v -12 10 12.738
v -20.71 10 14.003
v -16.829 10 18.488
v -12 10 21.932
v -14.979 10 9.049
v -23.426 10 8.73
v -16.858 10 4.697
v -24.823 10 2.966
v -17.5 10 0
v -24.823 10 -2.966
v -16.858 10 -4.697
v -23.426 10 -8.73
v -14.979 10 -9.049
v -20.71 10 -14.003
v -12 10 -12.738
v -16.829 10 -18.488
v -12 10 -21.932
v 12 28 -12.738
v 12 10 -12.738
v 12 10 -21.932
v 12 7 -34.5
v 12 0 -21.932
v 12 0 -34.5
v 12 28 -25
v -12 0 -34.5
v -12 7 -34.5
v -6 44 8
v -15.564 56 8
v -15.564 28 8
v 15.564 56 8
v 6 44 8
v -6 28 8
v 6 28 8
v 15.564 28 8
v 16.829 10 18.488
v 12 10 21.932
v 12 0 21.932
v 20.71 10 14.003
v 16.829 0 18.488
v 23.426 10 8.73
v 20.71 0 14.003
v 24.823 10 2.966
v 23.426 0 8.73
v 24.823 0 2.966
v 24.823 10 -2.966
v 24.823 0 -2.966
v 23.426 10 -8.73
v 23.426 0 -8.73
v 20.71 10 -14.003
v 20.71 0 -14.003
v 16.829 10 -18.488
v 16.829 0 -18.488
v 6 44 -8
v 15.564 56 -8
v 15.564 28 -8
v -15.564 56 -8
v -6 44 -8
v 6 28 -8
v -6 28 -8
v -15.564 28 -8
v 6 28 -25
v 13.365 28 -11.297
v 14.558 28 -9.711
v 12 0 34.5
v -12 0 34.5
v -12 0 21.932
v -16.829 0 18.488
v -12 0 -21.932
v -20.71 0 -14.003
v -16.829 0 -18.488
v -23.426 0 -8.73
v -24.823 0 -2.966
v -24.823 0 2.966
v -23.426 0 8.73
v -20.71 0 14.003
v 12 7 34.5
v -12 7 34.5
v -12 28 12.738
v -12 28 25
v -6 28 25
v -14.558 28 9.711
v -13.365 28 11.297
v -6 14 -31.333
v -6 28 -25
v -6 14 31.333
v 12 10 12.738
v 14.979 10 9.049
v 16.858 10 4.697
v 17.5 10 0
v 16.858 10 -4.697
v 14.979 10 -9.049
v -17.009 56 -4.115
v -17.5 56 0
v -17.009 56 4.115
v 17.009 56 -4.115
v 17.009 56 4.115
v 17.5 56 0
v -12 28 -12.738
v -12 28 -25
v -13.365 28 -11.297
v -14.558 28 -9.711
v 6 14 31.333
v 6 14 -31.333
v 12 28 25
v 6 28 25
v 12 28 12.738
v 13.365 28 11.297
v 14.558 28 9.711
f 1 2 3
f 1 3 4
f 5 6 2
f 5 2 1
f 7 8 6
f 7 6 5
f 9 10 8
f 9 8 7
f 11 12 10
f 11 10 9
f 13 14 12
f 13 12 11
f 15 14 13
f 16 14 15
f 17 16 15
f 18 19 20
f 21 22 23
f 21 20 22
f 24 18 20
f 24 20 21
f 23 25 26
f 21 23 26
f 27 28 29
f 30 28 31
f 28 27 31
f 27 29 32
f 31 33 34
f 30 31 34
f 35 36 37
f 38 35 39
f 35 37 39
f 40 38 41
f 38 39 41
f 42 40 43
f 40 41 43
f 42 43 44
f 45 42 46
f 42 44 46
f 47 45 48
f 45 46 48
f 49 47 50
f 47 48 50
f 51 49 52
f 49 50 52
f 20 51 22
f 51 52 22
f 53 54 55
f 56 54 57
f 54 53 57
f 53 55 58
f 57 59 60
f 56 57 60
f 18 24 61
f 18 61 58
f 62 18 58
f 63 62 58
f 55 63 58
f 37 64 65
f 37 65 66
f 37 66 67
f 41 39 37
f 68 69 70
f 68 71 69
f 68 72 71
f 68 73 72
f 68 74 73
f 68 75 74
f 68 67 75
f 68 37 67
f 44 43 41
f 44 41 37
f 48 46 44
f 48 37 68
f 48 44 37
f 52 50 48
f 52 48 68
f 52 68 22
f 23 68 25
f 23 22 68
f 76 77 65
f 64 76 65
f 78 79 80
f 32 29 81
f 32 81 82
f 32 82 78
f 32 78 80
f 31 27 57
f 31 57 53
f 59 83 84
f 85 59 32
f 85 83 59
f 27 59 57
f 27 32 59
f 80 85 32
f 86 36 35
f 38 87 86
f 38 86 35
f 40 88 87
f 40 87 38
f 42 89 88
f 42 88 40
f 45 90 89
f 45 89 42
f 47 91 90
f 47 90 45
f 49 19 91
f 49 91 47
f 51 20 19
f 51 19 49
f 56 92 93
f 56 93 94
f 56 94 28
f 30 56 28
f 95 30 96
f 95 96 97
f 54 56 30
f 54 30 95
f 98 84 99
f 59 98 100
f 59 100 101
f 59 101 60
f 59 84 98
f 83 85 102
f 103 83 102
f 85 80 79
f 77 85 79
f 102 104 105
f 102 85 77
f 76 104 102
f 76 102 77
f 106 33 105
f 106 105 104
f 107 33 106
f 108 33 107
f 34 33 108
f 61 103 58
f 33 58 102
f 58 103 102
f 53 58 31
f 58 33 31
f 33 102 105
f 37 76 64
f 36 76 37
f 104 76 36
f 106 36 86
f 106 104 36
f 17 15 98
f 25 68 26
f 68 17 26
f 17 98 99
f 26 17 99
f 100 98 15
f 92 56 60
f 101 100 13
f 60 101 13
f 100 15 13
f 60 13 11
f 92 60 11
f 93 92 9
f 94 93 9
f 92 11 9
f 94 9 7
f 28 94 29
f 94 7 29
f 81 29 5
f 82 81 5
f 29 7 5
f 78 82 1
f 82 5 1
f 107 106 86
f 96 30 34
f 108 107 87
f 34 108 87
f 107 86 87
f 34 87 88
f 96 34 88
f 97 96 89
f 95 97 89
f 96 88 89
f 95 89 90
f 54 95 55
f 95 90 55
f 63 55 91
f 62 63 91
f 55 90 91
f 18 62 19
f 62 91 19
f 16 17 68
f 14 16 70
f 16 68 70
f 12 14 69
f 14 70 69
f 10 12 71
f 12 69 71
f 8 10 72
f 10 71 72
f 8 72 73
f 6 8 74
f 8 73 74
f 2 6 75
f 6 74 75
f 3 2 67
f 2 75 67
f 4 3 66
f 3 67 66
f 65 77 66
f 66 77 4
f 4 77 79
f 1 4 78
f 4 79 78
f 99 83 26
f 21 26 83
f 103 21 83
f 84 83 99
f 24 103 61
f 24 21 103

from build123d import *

# Parameters (mm, degrees)
SKETCH1_R               = 25
BOSS_EXTRUDE1_DEPTH     = 10
SKETCH2_R               = 17.5
BOSS_EXTRUDE2_DEPTH     = 18
BOSS_EXTRUDE3_DEPTH     = 28
BOSS_EXTRUDE6_DEPTH     = 12
SKETCH5_W               = 12
SKETCH5_H               = 30
CUT_EXTRUDE3_DEPTH      = 35.5
CUT_EXTRUDE3_DEPTH_BACK = 35.5


with BuildPart() as part:
    # Sketch1 → Boss-Extrude1 (new body)
    with BuildSketch(Plane(origin=(0, 0, 0), x_dir=(1, 0, 0), z_dir=(0, 1, 0))):
        Circle(SKETCH1_R)
    extrude(amount=BOSS_EXTRUDE1_DEPTH)

    # Sketch2 → Boss-Extrude2 (add)
    with BuildSketch(Plane(origin=(0, 10, 0), x_dir=(1, 0, 0), z_dir=(0, 1, 0))):
        Circle(SKETCH2_R)
    extrude(amount=BOSS_EXTRUDE2_DEPTH)

    # Sketch3 → Boss-Extrude3 (add)
    with BuildSketch(Plane(origin=(0, 28, 0), x_dir=(1, 0, 0), z_dir=(0, 1, 0))):
        with BuildLine():
            Line((-15.564382416, -8), (15.564382416, -8))
            ThreePointArc((15.564382416, -8), (17.5, 0), (15.564382416, 8))
            Line((15.564382416, 8), (-15.564382416, 8))
            ThreePointArc((-15.564382416, 8), (-17.5, 0), (-15.564382416, -8))
        make_face()
    extrude(amount=BOSS_EXTRUDE3_DEPTH)

    # Sketch4 → Boss-Extrude6 (add, symmetric)
    with BuildSketch(Plane(origin=(0, 0, 0), x_dir=(0, 0, -1), z_dir=(1, 0, 0))):
        Polygon((34.5, 0), (34.5, 7), (25, 28), (-25, 28), (-34.5, 7), (-34.5, 0), align=None)
    extrude(amount=BOSS_EXTRUDE6_DEPTH, both=True)

    # Sketch5 → Cut-Extrude3 (cut, two sides)
    with BuildSketch(Plane.XY) as cut_extrude3_sk:
        with Locations((0, 29)):
            Rectangle(SKETCH5_W, SKETCH5_H)
    extrude(amount=CUT_EXTRUDE3_DEPTH, mode=Mode.SUBTRACT)
    extrude(cut_extrude3_sk.sketch, amount=-CUT_EXTRUDE3_DEPTH_BACK, mode=Mode.SUBTRACT)


solid = part.part
